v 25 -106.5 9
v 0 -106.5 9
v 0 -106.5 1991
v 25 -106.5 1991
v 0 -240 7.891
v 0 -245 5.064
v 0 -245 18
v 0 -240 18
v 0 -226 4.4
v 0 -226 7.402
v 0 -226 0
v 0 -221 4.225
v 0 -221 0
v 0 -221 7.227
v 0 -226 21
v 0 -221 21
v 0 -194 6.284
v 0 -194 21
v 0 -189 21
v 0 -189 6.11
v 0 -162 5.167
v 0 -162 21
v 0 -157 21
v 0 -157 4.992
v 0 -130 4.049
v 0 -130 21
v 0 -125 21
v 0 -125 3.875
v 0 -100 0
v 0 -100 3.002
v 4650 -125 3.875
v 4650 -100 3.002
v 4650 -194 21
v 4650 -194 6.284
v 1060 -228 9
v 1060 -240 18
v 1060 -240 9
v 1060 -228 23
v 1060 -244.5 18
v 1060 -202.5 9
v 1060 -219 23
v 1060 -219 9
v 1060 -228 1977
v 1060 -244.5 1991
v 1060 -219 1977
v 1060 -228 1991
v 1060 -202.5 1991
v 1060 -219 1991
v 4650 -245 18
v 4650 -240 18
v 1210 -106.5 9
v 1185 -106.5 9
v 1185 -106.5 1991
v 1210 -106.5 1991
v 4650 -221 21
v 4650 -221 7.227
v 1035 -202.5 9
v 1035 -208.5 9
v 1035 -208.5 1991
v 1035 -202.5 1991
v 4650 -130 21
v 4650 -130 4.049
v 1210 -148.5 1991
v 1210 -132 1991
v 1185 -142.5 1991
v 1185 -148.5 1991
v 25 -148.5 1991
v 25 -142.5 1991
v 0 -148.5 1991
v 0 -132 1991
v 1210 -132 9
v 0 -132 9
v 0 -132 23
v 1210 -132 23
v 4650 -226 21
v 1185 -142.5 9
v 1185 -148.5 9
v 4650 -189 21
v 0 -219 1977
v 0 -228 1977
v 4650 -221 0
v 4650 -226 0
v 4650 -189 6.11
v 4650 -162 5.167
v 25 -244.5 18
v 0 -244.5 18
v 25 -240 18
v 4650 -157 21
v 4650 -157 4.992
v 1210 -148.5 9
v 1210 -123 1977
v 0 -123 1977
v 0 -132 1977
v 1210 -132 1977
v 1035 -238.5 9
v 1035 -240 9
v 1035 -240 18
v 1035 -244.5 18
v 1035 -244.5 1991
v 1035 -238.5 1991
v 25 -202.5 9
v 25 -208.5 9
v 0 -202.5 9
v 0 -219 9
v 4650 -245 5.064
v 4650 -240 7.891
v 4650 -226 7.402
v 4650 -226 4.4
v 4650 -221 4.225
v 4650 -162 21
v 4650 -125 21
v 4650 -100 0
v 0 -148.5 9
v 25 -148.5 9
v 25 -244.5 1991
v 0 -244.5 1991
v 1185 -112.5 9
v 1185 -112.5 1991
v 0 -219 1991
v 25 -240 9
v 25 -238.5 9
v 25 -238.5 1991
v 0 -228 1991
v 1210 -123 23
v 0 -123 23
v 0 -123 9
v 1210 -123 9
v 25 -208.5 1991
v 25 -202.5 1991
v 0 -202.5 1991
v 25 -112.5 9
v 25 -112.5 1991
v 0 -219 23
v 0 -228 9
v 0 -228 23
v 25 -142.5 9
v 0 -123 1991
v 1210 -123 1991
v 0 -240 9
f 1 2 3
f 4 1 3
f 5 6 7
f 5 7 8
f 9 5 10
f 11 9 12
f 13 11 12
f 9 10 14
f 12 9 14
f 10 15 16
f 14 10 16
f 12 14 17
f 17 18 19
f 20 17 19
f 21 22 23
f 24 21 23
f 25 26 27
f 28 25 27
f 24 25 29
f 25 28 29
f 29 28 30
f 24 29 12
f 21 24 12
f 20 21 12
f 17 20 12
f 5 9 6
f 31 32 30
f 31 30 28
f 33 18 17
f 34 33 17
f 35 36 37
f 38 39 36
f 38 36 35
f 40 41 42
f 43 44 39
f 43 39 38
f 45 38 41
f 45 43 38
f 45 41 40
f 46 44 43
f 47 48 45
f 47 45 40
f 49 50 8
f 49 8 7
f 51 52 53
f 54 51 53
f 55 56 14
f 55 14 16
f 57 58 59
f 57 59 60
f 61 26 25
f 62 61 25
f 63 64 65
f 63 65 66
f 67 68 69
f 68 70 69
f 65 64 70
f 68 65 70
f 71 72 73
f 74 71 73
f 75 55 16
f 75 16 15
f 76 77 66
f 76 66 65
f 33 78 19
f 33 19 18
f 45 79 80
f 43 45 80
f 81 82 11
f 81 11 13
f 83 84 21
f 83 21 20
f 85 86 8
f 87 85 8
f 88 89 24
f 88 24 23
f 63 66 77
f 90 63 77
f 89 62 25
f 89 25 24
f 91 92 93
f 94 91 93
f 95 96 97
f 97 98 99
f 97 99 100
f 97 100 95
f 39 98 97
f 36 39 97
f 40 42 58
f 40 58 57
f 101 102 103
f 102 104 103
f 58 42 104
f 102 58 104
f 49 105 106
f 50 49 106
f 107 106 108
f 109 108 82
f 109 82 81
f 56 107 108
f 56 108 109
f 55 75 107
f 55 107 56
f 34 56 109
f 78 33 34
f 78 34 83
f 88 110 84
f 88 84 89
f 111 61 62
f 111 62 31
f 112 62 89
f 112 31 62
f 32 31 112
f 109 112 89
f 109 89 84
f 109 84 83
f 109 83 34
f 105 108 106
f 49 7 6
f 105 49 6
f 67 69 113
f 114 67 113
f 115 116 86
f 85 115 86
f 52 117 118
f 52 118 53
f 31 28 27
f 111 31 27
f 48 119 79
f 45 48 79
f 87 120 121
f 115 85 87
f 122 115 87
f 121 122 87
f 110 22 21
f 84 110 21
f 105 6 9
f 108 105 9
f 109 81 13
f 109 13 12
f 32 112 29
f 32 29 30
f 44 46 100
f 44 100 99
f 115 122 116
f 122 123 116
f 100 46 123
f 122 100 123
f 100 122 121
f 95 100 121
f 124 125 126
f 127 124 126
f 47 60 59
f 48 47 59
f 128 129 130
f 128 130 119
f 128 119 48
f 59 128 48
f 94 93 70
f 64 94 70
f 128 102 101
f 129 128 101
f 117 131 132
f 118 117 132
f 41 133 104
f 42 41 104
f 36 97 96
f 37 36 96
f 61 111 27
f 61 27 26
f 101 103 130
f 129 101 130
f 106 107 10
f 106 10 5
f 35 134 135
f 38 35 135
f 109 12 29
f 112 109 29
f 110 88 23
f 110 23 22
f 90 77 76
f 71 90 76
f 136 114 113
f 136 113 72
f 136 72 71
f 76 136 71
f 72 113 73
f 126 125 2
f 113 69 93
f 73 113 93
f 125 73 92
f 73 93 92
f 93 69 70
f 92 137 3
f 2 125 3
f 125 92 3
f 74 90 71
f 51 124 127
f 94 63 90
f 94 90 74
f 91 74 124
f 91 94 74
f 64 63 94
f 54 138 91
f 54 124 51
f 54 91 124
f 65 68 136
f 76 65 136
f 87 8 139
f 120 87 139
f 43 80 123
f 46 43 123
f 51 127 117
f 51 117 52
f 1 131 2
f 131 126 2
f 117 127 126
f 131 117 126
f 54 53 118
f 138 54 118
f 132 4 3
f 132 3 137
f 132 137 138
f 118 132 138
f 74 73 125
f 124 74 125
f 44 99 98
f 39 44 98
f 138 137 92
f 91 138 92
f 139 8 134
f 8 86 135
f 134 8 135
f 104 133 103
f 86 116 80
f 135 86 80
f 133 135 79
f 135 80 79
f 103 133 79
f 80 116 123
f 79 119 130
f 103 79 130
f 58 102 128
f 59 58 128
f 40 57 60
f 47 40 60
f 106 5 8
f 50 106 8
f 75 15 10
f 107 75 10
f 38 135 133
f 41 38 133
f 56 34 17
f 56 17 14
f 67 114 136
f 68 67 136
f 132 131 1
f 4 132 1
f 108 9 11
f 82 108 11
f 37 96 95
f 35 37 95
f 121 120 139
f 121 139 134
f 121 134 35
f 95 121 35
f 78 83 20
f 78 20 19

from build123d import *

# Parameters (mm, degrees)
F0_W     = 4.5
F0_H     = 9
F1_DEPTH = 4650
F2_DEPTH = 1210
F3_DEPTH = 25
F4_START = 1185
F4_DEPTH = 25
F5_DEPTH = 1060
F6_DEPTH = 25
F7_START = 1035
F7_DEPTH = 25


with BuildPart() as f1:
    # F0 (on Right) → F1 (new body)
    with BuildSketch(Plane.YZ):
        Polygon((-221, 4.2254131085), (-100, 0), (-100, 3.0018286329), (-125, 3.8748478702), (-125, 21), (-130, 21), (-130, 4.0494517176), (-157, 4.9923124939), (-157, 21), (-162, 21), (-162, 5.1669163414), (-189, 6.1097771177), (-189, 21), (-194, 21), (-194, 6.2843809651), (-221, 7.2272417414), (-221, 21), (-226, 21), (-226, 7.4018455889), (-240, 7.8907363617), (-240, 9), (-244.5, 9), (-244.5, 18), (-245, 18), (-245, 5.0635115763), (-226, 4.400016956), (-226, 0), (-221, 0), align=None)
        with Locations((-242.25, 13.5)):
            Rectangle(F0_W, F0_H)
    extrude(amount=F1_DEPTH)


with BuildPart() as f2:
    # F0 (on Right) → F2 (new body)
    with BuildSketch(Plane.YZ):
        Polygon((-132, 23), (-127.5, 23), (-123, 23), (-123, 9), (-112.5, 9), (-112.5, 1991), (-123, 1991), (-123, 1977), (-127.5, 1977), (-132, 1977), (-132, 1991), (-142.5, 1991), (-142.5, 9), (-132, 9), align=None)
    extrude(amount=F2_DEPTH)

    # F0 (on Right) → F3 (join)
    with BuildSketch(Plane.YZ):
        Polygon((-112.5, 1991), (-112.5, 9), (-106.5, 9), (-106.5, 1000), (-106.5, 1991), align=None)
        Polygon((-148.5, 9), (-142.5, 9), (-142.5, 1991), (-148.5, 1991), (-148.5, 1000), align=None)
    extrude(amount=F3_DEPTH)

    # F0 (on Right) → F4 (join)
    with BuildSketch(Plane.YZ.offset(F4_START)):
        Polygon((-112.5, 1991), (-112.5, 9), (-106.5, 9), (-106.5, 1000), (-106.5, 1991), align=None)
        Polygon((-148.5, 9), (-142.5, 9), (-142.5, 1991), (-148.5, 1991), (-148.5, 1000), align=None)
    extrude(amount=F4_DEPTH)


with BuildPart() as f5:
    # F0 (on Right) → F5 (new body)
    with BuildSketch(Plane.YZ):
        Polygon((-238.5, 1991), (-238.5, 9), (-228, 9), (-228, 23), (-223.5, 23), (-219, 23), (-219, 9), (-208.5, 9), (-208.5, 1991), (-219, 1991), (-219, 1977), (-223.5, 1977), (-228, 1977), (-228, 1991), align=None)
    extrude(amount=F5_DEPTH)

    # F0 (on Right) → F6 (join)
    with BuildSketch(Plane.YZ):
        Polygon((-208.5, 1991), (-208.5, 9), (-202.5, 9), (-202.5, 1000), (-202.5, 1991), align=None)
        Polygon((-244.5, 1000), (-244.5, 18), (-240, 18), (-240, 9), (-238.5, 9), (-238.5, 1991), (-244.5, 1991), align=None)
    extrude(amount=F6_DEPTH)

    # F0 (on Right) → F7 (join)
    with BuildSketch(Plane.YZ.offset(F7_START)):
        Polygon((-208.5, 1991), (-208.5, 9), (-202.5, 9), (-202.5, 1000), (-202.5, 1991), align=None)
        Polygon((-244.5, 1000), (-244.5, 18), (-240, 18), (-240, 9), (-238.5, 9), (-238.5, 1991), (-244.5, 1991), align=None)
    extrude(amount=F7_DEPTH)


solid = Compound([f1.part, f2.part, f5.part])
